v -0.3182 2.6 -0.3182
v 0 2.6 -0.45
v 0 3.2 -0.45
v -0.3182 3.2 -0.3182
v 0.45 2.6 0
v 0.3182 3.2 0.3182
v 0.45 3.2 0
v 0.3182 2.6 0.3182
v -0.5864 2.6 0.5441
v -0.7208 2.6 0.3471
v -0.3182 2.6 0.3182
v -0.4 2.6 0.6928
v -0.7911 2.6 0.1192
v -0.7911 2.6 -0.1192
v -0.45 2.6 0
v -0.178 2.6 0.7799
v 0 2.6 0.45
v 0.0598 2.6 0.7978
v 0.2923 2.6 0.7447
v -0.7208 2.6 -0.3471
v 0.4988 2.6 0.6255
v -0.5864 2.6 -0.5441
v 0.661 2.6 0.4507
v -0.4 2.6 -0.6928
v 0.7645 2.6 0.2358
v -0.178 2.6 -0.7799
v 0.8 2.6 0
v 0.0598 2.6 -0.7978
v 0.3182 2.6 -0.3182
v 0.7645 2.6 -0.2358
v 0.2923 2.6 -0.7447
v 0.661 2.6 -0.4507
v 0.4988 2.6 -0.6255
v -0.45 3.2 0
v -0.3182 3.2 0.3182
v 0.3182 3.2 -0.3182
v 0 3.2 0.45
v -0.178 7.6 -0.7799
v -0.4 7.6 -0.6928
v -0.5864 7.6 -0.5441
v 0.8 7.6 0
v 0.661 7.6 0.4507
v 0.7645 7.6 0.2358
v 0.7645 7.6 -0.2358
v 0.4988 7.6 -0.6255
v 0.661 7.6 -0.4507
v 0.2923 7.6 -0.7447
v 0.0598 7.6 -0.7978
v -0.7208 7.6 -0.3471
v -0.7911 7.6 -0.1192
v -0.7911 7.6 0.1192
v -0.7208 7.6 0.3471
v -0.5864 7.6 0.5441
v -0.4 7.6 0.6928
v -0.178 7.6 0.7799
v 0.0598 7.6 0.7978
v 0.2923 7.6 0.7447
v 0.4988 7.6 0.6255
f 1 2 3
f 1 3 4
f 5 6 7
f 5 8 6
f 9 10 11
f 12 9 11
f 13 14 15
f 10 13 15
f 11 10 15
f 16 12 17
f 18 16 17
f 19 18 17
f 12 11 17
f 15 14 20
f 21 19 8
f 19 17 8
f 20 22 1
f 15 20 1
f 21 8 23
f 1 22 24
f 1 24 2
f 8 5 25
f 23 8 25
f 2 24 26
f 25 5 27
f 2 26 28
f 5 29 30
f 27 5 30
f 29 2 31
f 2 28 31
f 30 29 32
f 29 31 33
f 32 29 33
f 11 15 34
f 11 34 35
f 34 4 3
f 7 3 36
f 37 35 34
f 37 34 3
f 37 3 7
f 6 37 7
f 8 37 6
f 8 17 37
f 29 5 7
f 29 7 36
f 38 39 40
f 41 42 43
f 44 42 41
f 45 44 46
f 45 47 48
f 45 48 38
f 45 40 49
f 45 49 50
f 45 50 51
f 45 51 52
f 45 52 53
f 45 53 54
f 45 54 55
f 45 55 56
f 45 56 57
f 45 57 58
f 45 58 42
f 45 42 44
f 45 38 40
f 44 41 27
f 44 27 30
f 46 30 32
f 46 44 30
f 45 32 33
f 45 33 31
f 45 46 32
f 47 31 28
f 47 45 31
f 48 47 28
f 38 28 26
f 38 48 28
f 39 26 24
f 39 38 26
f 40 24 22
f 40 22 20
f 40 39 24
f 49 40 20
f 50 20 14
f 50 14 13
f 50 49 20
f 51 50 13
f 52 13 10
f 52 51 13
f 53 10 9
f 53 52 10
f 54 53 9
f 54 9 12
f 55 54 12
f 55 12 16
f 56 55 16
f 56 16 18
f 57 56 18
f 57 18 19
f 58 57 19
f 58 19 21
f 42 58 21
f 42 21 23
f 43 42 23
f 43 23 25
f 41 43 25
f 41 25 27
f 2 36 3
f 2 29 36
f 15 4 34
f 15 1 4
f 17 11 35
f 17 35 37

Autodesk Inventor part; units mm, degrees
ref_plane "YZ Plane" through (0, 0, 0) normal (1, 0, 0) x (0, 1, 0)
ref_plane "Work Plane4" through (0, 0, 0) normal (0, -1, 0) x (1, 0, 0)
ref_plane "Work Plane10" through (0, 7.6, 0) normal (0, 1, 0) x (1, 0, 0)
sketch "Sketch7" plane through (0, 7.6, 0) normal (0, 1, 0) x (1, 0, 0)
  circle A0 centre (0, 0) radius 0.8
  dimension "d57" = 1.6
extrude "Extrusion7" add sketch "Sketch7" against normal blind 5
sketch "Sketch8" plane through (0, 2.6, 0) normal (0, -1, 0) x (1, 0, 0)
  line L0 (0.45, 0) -> (0.3182, -0.3182)
  line L1 (0.3182, -0.3182) -> (0, -0.45)
  line L2 (0, -0.45) -> (-0.3182, -0.3182)
  line L3 (-0.3182, -0.3182) -> (-0.45, 0)
  line L4 (-0.45, 0) -> (-0.3182, 0.3182)
  line L5 (-0.3182, 0.3182) -> (0, 0.45)
  line L6 (0, 0.45) -> (0.3182, 0.3182)
  line L7 (0.3182, 0.3182) -> (0.45, 0)
  point P0 (0, 0)
extrude "Extrusion8" cut sketch "Sketch8" against normal blind 0.6
thread "Thread5" size "M1.6x0.35" class "6g" standard "ANSI Metric M Profile" full length
properties part number "M2x6_D963"
